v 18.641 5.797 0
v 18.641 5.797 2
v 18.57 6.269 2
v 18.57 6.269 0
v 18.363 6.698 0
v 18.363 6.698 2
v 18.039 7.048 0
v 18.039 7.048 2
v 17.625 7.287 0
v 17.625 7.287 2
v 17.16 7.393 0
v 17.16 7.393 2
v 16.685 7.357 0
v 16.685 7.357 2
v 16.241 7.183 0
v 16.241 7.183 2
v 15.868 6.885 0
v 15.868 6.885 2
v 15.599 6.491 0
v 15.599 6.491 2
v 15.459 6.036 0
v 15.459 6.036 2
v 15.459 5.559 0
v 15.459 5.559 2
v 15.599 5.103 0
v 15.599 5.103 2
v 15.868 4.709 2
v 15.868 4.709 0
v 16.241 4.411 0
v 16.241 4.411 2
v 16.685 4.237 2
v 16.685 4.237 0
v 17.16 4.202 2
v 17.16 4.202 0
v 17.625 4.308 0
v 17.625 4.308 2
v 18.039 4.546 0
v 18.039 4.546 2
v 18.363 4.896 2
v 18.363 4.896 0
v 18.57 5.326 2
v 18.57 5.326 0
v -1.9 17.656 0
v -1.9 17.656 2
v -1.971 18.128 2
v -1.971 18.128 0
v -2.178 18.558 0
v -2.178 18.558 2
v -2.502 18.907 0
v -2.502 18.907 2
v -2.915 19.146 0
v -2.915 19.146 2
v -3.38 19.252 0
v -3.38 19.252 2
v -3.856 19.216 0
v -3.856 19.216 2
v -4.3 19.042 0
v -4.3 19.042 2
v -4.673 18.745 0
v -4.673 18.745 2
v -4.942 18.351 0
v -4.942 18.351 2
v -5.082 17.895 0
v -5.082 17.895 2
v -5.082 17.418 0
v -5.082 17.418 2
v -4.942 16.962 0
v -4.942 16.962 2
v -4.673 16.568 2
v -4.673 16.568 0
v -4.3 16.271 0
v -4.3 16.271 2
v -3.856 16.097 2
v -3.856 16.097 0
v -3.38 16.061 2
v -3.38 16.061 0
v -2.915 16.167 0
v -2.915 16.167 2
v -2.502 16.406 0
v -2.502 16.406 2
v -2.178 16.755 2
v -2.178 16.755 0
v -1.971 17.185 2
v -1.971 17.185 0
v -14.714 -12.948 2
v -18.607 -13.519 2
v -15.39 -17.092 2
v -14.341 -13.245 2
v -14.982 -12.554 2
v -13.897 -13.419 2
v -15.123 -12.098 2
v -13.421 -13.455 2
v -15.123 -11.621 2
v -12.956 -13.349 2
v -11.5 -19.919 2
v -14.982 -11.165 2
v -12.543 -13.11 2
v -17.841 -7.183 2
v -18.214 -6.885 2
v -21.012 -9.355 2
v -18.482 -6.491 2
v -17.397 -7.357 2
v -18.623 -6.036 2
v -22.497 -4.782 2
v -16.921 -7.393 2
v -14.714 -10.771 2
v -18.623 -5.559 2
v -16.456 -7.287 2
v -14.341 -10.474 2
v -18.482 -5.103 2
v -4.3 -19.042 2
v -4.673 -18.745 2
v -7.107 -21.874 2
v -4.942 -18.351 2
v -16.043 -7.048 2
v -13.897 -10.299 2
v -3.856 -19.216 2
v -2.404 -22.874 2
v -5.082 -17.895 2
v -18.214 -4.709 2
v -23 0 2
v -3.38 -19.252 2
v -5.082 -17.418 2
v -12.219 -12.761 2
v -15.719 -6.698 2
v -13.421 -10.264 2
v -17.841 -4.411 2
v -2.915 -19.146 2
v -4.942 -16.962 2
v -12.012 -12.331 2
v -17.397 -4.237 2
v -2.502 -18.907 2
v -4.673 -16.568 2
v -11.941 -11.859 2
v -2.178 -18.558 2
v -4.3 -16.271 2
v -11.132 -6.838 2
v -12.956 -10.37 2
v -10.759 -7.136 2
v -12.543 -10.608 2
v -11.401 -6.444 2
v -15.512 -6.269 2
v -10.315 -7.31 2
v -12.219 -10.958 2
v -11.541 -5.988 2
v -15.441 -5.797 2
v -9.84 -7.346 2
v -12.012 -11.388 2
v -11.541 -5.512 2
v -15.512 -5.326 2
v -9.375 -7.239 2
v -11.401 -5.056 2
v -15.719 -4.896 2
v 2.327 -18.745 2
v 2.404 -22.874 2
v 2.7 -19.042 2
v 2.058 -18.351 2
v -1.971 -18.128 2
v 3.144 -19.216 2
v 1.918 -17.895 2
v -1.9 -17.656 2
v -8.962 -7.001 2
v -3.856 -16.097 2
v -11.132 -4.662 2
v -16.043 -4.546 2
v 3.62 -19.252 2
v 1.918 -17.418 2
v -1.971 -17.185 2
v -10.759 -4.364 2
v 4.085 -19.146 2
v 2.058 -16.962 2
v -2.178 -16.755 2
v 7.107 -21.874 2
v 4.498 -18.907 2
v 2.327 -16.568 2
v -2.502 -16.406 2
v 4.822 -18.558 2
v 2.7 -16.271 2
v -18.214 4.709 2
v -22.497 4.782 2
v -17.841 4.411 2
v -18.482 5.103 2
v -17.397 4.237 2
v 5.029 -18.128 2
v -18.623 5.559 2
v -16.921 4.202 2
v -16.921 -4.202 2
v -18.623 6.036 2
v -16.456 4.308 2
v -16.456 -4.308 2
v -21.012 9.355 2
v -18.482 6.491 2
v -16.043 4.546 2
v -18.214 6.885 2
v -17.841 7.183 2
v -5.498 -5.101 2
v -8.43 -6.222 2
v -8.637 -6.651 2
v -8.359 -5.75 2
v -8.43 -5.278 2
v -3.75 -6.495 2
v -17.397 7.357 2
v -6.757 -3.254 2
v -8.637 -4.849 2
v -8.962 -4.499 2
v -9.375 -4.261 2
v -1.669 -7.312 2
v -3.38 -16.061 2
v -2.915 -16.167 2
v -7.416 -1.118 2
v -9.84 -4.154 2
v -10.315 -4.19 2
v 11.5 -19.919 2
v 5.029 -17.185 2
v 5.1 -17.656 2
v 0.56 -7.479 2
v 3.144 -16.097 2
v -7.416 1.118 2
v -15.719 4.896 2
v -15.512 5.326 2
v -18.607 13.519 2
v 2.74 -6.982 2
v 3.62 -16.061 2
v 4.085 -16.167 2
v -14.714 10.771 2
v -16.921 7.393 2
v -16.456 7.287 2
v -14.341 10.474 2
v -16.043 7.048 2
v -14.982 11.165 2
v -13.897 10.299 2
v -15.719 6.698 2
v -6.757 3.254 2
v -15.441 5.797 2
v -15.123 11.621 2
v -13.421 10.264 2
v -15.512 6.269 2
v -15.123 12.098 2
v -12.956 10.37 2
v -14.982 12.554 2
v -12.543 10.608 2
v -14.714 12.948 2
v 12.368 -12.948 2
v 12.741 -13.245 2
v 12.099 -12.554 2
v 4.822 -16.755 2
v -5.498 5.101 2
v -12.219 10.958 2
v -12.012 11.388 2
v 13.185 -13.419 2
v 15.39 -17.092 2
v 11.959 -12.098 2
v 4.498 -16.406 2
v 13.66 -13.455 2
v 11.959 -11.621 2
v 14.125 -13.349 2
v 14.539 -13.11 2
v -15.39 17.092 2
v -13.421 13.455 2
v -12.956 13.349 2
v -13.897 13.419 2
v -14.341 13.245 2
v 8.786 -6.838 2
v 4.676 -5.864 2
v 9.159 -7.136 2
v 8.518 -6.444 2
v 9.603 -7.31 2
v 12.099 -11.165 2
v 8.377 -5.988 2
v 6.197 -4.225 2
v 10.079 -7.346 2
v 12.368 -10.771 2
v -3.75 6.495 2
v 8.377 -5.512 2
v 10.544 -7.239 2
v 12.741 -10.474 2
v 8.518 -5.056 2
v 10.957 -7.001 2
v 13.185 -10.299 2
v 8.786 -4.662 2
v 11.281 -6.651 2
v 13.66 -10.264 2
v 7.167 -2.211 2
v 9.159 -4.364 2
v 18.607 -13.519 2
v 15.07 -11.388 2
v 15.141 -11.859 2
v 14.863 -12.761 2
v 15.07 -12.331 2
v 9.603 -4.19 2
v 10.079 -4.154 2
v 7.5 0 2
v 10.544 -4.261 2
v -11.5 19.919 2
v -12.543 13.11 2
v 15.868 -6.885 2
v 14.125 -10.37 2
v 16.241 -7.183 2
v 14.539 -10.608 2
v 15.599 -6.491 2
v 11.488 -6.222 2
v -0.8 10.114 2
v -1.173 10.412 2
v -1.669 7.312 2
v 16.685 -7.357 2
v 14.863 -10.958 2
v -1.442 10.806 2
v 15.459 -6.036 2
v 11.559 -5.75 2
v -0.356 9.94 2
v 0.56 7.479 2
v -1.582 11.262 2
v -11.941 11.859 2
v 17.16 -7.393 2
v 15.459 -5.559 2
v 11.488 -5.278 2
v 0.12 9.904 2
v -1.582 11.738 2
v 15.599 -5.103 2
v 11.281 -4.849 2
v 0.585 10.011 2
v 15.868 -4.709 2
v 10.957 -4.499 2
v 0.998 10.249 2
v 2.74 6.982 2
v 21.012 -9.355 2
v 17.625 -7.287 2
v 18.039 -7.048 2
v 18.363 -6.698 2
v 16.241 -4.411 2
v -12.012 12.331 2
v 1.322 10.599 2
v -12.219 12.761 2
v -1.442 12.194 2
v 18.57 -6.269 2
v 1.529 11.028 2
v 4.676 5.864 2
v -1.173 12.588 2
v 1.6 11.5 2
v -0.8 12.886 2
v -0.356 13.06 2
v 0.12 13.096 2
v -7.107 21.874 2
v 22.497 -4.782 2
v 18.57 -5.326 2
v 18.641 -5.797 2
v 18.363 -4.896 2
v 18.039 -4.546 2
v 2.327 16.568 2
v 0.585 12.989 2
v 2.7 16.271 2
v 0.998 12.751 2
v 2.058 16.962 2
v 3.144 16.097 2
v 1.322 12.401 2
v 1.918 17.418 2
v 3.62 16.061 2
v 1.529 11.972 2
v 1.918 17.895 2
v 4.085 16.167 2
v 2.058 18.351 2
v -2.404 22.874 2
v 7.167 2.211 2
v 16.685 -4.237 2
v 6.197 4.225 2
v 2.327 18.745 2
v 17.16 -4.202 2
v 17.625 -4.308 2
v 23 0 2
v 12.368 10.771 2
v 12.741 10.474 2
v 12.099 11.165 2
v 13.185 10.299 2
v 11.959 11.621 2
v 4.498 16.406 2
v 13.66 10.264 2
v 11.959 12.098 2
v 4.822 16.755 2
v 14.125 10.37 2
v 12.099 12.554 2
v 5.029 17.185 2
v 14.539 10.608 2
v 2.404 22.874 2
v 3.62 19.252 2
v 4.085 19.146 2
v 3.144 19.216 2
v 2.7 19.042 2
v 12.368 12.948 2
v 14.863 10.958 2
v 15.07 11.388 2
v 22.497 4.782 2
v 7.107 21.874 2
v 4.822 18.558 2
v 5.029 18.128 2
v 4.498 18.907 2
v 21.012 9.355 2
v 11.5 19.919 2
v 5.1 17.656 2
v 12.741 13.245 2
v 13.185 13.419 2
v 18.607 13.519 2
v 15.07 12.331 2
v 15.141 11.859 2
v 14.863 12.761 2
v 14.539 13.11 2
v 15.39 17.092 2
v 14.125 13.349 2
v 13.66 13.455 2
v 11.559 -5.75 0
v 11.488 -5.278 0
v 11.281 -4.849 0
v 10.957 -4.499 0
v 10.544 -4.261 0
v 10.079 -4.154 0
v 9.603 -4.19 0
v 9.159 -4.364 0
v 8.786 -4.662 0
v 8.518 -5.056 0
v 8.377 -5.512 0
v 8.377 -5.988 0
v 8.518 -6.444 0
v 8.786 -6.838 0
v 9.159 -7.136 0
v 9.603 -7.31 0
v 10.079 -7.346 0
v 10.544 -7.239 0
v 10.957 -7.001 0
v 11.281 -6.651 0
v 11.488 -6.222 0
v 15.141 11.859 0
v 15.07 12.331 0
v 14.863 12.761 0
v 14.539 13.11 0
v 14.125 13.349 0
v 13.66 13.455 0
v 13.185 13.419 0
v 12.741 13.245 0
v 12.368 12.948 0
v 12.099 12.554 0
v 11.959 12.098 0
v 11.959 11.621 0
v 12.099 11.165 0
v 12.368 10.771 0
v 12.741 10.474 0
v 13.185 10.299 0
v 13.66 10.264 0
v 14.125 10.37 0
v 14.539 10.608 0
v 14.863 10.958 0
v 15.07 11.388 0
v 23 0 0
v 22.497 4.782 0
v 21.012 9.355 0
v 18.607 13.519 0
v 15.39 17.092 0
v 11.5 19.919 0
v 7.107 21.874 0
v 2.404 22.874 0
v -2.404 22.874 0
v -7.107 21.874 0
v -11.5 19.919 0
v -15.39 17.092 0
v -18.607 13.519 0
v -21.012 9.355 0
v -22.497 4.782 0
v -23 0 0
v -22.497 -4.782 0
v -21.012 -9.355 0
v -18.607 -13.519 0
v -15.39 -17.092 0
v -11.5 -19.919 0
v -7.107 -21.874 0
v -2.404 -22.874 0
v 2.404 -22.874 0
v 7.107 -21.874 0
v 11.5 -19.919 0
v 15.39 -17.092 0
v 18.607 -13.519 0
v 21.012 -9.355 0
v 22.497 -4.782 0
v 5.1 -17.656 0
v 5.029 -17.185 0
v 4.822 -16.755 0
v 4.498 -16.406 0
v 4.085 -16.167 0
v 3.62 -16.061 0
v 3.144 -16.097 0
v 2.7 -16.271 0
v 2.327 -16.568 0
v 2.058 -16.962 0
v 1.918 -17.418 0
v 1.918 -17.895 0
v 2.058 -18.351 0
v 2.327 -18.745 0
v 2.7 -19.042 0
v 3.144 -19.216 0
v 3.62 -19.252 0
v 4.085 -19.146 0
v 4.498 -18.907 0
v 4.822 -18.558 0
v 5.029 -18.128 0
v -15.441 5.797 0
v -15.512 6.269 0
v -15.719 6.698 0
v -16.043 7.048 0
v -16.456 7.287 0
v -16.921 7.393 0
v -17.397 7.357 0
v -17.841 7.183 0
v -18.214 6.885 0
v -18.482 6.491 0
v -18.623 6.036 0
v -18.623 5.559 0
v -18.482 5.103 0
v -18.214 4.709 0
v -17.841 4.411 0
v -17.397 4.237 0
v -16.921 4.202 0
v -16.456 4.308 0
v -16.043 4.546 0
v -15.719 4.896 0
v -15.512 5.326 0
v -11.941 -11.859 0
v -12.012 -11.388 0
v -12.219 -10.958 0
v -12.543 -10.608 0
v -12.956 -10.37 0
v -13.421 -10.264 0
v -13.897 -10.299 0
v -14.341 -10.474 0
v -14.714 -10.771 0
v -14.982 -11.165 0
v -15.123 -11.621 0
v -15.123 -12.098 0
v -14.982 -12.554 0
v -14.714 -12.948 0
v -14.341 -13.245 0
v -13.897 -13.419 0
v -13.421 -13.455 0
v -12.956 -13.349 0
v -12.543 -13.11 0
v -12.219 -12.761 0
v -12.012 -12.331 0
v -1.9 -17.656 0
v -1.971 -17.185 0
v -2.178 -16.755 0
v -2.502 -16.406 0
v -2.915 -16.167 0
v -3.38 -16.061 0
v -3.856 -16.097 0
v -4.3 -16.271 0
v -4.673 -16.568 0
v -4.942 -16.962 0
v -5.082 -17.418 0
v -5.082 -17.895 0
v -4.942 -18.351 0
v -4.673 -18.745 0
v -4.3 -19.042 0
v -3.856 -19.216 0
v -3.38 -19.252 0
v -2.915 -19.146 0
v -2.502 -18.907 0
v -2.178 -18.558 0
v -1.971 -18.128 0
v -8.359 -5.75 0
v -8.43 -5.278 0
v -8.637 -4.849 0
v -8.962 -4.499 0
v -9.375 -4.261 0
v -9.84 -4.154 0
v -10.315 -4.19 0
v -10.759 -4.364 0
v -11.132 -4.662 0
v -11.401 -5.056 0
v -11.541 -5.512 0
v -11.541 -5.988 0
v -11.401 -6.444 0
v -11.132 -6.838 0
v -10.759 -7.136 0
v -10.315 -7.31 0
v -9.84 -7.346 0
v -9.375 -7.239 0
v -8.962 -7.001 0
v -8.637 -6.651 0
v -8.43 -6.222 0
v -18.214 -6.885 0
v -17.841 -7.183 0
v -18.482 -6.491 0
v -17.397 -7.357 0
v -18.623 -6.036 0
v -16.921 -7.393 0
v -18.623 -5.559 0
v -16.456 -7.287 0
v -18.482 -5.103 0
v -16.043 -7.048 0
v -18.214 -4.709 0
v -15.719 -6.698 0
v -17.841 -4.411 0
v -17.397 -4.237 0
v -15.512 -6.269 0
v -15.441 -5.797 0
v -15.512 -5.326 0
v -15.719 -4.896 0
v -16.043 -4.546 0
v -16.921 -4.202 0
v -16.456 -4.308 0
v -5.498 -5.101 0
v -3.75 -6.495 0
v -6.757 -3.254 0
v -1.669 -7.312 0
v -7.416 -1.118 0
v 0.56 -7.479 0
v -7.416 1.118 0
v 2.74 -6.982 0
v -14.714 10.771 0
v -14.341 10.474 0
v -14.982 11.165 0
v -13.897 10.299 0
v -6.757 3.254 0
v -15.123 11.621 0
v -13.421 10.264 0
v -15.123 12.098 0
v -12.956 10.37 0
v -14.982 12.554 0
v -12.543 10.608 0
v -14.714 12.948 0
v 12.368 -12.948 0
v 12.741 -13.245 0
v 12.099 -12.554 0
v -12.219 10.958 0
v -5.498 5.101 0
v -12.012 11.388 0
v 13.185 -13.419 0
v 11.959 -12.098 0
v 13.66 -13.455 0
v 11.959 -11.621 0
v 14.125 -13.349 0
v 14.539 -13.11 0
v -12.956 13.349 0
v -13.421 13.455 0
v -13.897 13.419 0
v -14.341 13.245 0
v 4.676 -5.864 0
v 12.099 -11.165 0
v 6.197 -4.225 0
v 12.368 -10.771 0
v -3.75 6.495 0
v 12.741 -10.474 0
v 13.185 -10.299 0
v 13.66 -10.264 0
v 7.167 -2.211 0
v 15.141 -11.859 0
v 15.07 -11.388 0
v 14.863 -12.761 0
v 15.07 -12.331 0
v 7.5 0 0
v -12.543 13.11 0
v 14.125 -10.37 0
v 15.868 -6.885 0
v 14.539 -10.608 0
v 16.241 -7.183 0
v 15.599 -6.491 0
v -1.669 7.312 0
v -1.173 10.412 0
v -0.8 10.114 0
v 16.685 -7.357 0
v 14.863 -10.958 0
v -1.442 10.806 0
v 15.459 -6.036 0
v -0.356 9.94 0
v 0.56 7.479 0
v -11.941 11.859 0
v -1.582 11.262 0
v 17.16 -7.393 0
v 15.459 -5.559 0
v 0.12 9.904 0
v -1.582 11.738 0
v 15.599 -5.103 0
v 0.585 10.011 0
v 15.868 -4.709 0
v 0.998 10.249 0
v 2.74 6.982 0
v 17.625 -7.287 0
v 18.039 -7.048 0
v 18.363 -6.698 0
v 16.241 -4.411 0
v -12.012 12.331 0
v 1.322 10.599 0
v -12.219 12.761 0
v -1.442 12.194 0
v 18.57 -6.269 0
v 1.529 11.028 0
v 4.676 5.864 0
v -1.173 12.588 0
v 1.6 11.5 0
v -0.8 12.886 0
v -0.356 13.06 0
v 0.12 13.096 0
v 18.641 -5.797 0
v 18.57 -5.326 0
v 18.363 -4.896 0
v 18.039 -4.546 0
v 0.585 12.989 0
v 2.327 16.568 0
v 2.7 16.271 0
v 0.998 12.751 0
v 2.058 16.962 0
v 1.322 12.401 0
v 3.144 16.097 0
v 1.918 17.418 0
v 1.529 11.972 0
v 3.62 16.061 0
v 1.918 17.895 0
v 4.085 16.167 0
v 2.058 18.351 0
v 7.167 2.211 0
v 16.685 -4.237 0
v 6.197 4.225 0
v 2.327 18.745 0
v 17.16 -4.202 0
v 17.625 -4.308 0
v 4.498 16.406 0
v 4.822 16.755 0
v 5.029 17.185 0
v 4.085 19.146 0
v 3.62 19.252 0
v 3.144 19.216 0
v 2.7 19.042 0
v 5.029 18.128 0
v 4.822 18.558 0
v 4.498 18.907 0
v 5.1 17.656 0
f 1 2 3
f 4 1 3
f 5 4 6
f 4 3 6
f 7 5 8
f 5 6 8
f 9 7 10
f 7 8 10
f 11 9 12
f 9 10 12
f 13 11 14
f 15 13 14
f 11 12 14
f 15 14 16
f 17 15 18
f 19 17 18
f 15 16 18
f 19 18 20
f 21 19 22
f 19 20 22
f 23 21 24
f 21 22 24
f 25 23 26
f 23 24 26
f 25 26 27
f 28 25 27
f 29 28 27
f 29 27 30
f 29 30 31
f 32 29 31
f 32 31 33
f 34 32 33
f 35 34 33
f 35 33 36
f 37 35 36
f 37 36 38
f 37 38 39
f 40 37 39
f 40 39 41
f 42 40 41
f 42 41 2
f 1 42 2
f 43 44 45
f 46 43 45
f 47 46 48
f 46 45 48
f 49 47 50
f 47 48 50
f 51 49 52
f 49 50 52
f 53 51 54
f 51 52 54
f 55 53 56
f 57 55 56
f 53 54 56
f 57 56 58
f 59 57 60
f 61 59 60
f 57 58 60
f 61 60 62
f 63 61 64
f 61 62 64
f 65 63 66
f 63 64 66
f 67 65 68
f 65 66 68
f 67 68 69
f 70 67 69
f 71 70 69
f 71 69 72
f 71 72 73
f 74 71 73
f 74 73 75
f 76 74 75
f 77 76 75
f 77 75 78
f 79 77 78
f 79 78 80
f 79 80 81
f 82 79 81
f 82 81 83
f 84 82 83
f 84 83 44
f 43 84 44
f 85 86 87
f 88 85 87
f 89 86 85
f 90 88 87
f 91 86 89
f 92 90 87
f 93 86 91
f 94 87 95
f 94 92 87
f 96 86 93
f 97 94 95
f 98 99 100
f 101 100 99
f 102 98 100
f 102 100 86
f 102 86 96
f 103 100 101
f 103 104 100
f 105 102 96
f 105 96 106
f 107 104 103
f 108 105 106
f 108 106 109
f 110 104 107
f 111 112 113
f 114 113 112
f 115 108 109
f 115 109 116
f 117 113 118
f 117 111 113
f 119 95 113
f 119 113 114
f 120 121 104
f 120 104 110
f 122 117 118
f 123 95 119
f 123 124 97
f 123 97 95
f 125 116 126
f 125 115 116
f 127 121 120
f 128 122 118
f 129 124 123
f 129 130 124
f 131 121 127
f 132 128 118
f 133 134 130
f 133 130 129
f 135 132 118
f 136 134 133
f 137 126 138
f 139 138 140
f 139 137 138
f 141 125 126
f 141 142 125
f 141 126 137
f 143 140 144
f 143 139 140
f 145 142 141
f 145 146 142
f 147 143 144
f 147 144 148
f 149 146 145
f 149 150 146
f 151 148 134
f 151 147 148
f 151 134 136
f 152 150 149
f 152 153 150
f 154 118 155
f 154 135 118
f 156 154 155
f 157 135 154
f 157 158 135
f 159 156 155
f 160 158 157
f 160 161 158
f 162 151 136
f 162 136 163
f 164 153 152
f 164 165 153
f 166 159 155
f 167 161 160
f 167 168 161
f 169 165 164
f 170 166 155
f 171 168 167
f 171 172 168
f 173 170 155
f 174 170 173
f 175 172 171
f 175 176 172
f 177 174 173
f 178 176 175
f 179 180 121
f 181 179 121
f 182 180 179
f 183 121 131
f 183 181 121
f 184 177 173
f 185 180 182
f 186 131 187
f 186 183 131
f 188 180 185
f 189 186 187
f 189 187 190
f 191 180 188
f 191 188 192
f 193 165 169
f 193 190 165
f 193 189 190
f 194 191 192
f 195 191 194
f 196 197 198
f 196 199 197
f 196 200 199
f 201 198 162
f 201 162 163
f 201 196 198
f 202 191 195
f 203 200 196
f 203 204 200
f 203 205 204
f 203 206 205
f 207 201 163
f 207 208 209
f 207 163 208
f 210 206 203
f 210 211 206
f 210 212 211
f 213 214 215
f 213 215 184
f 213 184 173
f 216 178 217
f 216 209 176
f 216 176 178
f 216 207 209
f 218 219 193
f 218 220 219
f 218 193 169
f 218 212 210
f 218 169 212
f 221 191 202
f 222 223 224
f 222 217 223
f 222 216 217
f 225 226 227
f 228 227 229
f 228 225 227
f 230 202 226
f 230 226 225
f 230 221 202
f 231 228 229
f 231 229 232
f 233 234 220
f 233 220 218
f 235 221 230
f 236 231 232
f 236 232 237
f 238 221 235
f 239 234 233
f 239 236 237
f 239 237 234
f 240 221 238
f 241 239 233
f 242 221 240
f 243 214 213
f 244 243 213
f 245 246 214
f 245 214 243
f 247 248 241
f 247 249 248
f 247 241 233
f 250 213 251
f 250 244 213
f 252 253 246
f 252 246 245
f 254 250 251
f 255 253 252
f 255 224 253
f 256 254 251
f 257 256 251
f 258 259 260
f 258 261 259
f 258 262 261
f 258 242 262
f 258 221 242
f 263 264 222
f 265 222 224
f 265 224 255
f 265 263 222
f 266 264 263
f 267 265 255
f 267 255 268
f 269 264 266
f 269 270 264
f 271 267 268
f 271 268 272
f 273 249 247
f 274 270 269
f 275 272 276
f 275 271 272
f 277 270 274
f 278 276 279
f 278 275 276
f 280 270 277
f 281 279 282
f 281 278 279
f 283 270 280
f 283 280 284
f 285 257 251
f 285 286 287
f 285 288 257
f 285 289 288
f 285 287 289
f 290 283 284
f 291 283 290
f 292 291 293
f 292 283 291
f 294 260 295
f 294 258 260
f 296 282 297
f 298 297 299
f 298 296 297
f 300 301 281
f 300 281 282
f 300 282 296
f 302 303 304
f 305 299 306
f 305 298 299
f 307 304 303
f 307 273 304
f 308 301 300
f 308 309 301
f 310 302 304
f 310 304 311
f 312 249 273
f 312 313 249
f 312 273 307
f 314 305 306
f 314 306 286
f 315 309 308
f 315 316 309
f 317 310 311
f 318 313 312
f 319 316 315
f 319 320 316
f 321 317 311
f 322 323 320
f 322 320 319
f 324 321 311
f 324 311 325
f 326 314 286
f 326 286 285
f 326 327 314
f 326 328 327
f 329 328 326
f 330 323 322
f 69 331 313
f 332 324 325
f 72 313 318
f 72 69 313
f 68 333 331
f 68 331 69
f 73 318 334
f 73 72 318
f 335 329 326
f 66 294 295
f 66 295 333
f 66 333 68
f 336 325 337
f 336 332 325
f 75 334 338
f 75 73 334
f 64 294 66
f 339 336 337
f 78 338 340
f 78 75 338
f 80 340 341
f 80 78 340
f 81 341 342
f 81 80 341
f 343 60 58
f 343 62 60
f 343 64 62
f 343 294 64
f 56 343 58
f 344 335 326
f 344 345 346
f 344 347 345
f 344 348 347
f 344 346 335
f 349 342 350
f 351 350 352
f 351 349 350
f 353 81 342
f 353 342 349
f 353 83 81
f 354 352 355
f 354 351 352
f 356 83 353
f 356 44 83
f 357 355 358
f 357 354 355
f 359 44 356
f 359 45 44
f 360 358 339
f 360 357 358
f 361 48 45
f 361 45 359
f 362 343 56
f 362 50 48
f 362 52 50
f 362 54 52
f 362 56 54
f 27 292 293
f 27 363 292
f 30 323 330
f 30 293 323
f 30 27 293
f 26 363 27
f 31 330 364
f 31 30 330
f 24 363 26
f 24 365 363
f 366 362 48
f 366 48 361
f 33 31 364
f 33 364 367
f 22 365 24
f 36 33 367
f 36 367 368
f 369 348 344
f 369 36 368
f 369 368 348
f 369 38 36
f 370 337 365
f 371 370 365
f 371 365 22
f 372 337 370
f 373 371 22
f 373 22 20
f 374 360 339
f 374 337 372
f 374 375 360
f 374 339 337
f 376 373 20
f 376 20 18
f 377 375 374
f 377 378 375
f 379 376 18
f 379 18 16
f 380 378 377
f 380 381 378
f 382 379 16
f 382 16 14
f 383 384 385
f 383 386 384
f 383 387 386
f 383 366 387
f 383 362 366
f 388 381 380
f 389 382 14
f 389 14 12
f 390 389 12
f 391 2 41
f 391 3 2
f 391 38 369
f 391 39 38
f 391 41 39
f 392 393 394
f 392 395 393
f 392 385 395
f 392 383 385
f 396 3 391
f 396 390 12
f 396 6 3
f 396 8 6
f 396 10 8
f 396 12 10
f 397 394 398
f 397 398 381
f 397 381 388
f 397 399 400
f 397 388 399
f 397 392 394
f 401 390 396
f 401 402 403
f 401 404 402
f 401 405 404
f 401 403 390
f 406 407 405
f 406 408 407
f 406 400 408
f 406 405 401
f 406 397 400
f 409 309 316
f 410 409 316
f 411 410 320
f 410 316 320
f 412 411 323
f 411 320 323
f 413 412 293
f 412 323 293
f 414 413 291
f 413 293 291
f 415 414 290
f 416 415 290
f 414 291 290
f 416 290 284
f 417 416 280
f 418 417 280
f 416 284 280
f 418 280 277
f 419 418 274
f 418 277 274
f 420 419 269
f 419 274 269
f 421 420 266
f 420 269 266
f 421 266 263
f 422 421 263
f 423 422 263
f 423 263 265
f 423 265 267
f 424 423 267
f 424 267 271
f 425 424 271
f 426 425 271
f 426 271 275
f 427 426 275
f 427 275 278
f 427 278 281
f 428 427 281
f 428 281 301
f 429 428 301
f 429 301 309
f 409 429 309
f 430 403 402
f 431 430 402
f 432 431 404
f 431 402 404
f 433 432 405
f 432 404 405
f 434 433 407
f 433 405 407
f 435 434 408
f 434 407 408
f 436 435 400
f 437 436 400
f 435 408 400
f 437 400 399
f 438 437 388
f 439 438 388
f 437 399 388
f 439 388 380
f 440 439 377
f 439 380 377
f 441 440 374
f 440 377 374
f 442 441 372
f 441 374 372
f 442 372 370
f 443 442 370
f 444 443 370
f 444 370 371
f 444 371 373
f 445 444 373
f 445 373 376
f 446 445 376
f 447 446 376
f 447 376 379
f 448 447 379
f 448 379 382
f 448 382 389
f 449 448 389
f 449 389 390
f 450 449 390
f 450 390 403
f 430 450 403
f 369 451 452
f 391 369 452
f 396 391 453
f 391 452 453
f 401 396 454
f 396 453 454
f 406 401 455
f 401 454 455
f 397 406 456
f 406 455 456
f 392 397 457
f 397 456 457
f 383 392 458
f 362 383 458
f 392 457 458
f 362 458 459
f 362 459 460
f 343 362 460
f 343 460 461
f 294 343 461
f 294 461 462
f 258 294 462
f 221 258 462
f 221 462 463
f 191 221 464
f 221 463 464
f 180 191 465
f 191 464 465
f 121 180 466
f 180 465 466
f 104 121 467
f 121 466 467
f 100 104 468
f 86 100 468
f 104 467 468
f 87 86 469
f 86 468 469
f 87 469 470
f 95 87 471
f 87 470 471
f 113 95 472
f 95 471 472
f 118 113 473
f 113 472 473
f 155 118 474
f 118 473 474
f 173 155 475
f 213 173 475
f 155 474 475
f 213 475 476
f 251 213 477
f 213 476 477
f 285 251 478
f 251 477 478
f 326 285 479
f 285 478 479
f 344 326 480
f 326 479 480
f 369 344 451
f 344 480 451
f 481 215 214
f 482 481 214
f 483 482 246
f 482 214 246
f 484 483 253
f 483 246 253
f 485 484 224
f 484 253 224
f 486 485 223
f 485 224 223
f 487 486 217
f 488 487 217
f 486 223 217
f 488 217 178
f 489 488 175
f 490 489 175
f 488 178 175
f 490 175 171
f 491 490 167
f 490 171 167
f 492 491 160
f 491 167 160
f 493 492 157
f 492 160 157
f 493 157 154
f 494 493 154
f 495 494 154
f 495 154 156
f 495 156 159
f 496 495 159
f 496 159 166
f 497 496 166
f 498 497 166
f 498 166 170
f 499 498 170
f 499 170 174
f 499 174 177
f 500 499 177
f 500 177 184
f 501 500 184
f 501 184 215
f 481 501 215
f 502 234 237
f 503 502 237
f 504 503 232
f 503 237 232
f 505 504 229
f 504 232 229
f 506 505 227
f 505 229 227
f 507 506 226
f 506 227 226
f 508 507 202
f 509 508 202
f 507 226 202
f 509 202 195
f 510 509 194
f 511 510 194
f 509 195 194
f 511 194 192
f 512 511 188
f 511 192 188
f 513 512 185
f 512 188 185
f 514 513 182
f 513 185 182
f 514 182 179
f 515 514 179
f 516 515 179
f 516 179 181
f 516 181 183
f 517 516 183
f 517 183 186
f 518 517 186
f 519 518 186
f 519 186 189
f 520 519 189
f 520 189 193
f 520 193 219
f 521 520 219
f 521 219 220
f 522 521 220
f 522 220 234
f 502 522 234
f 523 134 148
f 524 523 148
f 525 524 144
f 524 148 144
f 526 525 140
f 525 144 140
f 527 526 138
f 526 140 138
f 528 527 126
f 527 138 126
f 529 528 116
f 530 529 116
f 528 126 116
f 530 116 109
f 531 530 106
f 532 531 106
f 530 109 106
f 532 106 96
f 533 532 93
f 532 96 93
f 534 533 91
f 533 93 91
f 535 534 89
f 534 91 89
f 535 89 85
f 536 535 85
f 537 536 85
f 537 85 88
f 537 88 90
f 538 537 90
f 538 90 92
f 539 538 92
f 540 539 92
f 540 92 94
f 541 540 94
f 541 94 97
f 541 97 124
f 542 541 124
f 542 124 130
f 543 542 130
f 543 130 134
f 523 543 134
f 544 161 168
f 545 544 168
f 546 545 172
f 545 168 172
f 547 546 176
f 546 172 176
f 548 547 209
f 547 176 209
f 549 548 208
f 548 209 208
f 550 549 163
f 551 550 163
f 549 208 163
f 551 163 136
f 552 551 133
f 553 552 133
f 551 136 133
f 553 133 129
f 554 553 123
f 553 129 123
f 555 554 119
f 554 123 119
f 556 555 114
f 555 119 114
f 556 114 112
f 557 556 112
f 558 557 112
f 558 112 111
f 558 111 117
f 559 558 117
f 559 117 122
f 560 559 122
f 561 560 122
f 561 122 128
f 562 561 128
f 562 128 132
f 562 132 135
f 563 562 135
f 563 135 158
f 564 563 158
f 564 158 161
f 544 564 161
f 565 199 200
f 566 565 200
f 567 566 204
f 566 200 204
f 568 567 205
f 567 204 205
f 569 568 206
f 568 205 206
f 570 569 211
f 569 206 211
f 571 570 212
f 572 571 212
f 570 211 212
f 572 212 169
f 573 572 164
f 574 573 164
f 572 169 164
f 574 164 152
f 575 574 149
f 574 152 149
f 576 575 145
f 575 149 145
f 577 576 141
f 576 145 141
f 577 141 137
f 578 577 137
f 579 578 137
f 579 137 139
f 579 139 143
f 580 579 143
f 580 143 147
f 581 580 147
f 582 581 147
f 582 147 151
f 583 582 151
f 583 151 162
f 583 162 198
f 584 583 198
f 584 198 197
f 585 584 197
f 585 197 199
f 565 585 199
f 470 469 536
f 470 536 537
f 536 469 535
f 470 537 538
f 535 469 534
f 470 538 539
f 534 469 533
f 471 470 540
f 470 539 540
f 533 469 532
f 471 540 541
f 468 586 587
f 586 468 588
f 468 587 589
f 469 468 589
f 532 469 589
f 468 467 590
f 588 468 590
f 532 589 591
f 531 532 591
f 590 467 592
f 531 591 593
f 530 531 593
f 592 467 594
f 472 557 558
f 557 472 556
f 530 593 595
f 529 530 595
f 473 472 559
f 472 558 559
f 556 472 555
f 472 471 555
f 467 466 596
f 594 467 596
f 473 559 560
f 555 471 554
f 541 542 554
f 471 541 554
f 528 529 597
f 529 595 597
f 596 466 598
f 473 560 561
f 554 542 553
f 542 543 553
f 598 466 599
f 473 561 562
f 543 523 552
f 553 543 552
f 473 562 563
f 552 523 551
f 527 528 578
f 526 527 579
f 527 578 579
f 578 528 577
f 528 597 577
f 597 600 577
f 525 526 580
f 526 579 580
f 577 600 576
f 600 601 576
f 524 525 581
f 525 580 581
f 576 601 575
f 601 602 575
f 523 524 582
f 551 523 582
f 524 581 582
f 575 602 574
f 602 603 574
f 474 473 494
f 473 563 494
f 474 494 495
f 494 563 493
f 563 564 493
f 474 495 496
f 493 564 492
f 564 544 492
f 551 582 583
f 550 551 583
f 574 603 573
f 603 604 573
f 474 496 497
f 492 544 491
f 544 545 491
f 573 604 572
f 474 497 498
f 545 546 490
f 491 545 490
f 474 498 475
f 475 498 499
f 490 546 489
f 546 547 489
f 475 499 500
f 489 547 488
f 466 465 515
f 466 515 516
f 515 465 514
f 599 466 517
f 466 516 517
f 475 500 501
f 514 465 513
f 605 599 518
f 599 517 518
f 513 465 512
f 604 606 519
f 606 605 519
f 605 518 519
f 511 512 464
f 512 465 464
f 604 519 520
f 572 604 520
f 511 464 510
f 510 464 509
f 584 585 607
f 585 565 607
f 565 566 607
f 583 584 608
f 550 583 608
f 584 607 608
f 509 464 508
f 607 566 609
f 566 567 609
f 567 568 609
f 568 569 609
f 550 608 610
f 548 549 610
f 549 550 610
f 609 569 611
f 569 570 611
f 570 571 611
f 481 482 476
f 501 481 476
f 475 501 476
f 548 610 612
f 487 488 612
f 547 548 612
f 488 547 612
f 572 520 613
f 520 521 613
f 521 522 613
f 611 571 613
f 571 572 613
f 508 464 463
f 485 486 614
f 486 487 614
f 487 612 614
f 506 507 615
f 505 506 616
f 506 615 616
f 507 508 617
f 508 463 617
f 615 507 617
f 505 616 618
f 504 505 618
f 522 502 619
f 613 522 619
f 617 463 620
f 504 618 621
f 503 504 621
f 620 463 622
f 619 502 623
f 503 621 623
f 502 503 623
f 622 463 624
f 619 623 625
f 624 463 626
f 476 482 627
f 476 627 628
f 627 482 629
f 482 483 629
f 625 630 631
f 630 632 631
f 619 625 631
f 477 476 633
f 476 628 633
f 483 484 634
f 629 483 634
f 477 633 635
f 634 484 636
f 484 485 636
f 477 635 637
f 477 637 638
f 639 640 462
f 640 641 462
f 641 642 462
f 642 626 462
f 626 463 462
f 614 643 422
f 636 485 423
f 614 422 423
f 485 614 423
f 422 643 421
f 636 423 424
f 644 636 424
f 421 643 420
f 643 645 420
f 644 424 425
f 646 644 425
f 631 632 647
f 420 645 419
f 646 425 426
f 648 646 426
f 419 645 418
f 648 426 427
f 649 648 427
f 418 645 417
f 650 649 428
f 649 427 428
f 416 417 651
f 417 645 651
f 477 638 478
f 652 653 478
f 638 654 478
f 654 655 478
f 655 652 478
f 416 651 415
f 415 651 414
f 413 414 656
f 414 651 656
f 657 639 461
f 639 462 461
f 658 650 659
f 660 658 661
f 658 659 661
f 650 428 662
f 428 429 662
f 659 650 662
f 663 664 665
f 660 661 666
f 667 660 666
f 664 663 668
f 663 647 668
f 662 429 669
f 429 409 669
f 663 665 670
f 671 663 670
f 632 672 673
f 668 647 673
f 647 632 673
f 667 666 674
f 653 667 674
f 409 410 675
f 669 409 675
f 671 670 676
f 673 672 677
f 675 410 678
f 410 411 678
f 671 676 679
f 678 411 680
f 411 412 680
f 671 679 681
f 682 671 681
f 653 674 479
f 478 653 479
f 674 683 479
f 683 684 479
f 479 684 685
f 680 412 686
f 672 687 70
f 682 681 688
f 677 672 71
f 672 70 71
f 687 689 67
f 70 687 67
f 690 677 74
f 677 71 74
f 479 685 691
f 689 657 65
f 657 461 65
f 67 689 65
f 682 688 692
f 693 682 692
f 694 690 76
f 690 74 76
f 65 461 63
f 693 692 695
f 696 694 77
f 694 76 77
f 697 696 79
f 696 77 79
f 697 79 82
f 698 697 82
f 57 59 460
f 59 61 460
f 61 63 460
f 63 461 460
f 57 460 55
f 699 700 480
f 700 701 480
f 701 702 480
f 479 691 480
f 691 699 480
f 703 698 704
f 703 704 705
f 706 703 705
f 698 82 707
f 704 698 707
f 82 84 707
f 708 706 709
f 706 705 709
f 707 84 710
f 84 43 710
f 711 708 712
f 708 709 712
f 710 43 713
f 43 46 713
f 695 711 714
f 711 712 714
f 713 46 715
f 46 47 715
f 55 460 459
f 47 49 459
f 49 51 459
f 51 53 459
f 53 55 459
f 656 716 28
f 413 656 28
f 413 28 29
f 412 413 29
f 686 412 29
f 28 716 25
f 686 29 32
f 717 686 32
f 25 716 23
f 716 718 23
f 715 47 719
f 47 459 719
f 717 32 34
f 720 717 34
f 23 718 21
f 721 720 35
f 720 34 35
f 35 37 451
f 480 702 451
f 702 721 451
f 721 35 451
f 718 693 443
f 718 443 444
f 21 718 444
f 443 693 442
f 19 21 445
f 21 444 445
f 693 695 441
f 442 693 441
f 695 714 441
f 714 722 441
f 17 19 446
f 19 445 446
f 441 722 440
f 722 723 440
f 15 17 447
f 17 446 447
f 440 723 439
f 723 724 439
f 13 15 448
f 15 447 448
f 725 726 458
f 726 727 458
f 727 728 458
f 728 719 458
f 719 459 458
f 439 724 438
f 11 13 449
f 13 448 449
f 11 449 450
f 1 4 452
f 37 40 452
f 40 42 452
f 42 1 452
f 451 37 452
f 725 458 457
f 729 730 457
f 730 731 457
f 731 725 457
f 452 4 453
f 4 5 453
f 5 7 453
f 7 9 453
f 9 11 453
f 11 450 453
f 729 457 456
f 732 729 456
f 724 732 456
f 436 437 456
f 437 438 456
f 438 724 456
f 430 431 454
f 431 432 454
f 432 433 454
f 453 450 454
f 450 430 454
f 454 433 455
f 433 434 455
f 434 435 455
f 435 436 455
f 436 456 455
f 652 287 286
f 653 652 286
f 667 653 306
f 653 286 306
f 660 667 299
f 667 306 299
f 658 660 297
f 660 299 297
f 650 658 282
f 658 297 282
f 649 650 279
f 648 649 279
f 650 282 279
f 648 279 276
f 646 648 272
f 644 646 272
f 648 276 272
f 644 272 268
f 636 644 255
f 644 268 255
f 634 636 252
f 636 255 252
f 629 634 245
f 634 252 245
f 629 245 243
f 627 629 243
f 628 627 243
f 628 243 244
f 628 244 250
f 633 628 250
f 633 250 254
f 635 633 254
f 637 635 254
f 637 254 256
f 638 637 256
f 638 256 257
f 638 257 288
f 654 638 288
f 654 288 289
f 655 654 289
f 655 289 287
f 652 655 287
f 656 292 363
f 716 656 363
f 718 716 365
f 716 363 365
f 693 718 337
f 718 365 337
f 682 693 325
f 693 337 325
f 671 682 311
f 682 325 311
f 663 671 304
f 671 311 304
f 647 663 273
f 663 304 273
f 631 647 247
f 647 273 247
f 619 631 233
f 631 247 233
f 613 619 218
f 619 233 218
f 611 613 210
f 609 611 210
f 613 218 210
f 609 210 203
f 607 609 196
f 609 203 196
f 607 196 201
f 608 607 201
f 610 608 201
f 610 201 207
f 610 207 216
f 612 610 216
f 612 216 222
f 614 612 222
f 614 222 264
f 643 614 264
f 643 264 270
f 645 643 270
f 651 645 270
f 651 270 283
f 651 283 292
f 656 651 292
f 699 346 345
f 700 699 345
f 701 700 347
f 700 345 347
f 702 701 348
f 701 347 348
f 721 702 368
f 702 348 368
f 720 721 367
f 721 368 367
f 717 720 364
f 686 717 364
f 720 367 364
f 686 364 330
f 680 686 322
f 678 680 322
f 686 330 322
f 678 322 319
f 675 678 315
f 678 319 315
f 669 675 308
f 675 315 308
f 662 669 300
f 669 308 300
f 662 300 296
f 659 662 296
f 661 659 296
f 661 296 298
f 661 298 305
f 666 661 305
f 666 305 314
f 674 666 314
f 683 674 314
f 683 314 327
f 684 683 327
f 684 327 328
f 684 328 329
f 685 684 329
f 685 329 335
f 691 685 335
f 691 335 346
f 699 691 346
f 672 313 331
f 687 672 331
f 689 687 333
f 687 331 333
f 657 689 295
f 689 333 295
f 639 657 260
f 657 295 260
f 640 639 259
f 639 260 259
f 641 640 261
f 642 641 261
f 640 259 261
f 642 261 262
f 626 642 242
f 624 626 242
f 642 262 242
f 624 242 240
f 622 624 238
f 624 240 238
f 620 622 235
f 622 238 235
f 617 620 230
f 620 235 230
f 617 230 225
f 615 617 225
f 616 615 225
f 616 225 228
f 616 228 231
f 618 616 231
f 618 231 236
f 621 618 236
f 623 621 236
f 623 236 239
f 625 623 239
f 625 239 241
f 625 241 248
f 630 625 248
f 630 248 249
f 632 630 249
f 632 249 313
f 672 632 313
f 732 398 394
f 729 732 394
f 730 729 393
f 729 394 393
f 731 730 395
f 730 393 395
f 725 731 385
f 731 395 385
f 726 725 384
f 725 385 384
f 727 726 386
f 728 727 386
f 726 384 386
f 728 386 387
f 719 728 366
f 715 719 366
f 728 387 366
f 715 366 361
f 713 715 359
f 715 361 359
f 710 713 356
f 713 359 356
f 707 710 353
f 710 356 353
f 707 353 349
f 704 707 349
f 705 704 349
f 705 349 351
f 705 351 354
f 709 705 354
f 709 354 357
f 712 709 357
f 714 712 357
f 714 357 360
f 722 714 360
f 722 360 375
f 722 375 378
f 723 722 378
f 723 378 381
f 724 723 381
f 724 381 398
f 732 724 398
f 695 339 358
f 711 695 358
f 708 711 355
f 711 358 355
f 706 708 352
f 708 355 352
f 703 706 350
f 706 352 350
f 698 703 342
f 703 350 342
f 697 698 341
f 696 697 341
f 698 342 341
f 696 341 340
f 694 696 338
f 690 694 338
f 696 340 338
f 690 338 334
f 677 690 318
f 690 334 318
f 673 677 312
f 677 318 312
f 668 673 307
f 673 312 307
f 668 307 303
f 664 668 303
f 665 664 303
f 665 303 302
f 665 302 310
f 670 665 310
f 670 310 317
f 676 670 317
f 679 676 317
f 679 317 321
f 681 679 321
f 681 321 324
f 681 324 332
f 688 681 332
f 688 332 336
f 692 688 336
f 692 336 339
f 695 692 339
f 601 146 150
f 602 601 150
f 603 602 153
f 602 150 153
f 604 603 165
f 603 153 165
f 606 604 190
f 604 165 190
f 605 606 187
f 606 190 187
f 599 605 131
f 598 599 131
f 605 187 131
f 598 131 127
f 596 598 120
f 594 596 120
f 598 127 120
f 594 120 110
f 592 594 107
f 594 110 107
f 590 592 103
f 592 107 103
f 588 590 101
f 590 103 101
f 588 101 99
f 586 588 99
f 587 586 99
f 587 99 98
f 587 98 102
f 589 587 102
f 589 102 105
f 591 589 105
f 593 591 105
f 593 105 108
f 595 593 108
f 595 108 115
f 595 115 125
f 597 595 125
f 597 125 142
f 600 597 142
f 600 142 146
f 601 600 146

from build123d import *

# Parameters (mm, degrees)
SKETCH_1_R          = 23
EXTRUDE_1_DEPTH     = 2
SKETCH_2_R          = 1.6
SKETCH_2_R_2        = 7.5
CUT_EXTRUDE_1_DEPTH = 33.588341474


with BuildPart() as part:
    # ｽｹｯﾁ1 → ﾎﾞｽ - 押し出し1 (new body)
    with BuildSketch(Plane.XY):
        Circle(SKETCH_1_R)
    extrude(amount=EXTRUDE_1_DEPTH)

    # ｽｹｯﾁ2 → ｶｯﾄ - 押し出し1 (cut, through all)
    with BuildSketch(Plane.XY.offset(2)):
        with Locations((-3.5, 17.656443583)):
            Circle(SKETCH_2_R)
        with Locations((3.5, 17.656443583)):
            Circle(SKETCH_2_R)
        with Locations((13.540928683, 11.859310705)):
            Circle(SKETCH_2_R)
        with Locations((17.040928683, 5.797132878)):
            Circle(SKETCH_2_R)
        with Locations((17.040928683, -5.797132878)):
            Circle(SKETCH_2_R)
        with Locations((13.540928683, -11.859310705)):
            Circle(SKETCH_2_R)
        with Locations((3.5, -17.656443583)):
            Circle(SKETCH_2_R)
        with Locations((-3.5, -17.656443583)):
            Circle(SKETCH_2_R)
        with Locations((-13.540928683, -11.859310705)):
            Circle(SKETCH_2_R)
        with Locations((-17.040928683, -5.797132878)):
            Circle(SKETCH_2_R)
        with Locations((-17.040928683, 5.797132878)):
            Circle(SKETCH_2_R)
        with Locations((-13.540928683, 11.859310705)):
            Circle(SKETCH_2_R)
        Circle(SKETCH_2_R_2)
        with Locations((0, 11.5)):
            Circle(SKETCH_2_R)
        with Locations((-9.959292144, -5.75)):
            Circle(SKETCH_2_R)
        with Locations((9.959292144, -5.75)):
            Circle(SKETCH_2_R)
    extrude(amount=-CUT_EXTRUDE_1_DEPTH, mode=Mode.SUBTRACT)


solid = part.part
